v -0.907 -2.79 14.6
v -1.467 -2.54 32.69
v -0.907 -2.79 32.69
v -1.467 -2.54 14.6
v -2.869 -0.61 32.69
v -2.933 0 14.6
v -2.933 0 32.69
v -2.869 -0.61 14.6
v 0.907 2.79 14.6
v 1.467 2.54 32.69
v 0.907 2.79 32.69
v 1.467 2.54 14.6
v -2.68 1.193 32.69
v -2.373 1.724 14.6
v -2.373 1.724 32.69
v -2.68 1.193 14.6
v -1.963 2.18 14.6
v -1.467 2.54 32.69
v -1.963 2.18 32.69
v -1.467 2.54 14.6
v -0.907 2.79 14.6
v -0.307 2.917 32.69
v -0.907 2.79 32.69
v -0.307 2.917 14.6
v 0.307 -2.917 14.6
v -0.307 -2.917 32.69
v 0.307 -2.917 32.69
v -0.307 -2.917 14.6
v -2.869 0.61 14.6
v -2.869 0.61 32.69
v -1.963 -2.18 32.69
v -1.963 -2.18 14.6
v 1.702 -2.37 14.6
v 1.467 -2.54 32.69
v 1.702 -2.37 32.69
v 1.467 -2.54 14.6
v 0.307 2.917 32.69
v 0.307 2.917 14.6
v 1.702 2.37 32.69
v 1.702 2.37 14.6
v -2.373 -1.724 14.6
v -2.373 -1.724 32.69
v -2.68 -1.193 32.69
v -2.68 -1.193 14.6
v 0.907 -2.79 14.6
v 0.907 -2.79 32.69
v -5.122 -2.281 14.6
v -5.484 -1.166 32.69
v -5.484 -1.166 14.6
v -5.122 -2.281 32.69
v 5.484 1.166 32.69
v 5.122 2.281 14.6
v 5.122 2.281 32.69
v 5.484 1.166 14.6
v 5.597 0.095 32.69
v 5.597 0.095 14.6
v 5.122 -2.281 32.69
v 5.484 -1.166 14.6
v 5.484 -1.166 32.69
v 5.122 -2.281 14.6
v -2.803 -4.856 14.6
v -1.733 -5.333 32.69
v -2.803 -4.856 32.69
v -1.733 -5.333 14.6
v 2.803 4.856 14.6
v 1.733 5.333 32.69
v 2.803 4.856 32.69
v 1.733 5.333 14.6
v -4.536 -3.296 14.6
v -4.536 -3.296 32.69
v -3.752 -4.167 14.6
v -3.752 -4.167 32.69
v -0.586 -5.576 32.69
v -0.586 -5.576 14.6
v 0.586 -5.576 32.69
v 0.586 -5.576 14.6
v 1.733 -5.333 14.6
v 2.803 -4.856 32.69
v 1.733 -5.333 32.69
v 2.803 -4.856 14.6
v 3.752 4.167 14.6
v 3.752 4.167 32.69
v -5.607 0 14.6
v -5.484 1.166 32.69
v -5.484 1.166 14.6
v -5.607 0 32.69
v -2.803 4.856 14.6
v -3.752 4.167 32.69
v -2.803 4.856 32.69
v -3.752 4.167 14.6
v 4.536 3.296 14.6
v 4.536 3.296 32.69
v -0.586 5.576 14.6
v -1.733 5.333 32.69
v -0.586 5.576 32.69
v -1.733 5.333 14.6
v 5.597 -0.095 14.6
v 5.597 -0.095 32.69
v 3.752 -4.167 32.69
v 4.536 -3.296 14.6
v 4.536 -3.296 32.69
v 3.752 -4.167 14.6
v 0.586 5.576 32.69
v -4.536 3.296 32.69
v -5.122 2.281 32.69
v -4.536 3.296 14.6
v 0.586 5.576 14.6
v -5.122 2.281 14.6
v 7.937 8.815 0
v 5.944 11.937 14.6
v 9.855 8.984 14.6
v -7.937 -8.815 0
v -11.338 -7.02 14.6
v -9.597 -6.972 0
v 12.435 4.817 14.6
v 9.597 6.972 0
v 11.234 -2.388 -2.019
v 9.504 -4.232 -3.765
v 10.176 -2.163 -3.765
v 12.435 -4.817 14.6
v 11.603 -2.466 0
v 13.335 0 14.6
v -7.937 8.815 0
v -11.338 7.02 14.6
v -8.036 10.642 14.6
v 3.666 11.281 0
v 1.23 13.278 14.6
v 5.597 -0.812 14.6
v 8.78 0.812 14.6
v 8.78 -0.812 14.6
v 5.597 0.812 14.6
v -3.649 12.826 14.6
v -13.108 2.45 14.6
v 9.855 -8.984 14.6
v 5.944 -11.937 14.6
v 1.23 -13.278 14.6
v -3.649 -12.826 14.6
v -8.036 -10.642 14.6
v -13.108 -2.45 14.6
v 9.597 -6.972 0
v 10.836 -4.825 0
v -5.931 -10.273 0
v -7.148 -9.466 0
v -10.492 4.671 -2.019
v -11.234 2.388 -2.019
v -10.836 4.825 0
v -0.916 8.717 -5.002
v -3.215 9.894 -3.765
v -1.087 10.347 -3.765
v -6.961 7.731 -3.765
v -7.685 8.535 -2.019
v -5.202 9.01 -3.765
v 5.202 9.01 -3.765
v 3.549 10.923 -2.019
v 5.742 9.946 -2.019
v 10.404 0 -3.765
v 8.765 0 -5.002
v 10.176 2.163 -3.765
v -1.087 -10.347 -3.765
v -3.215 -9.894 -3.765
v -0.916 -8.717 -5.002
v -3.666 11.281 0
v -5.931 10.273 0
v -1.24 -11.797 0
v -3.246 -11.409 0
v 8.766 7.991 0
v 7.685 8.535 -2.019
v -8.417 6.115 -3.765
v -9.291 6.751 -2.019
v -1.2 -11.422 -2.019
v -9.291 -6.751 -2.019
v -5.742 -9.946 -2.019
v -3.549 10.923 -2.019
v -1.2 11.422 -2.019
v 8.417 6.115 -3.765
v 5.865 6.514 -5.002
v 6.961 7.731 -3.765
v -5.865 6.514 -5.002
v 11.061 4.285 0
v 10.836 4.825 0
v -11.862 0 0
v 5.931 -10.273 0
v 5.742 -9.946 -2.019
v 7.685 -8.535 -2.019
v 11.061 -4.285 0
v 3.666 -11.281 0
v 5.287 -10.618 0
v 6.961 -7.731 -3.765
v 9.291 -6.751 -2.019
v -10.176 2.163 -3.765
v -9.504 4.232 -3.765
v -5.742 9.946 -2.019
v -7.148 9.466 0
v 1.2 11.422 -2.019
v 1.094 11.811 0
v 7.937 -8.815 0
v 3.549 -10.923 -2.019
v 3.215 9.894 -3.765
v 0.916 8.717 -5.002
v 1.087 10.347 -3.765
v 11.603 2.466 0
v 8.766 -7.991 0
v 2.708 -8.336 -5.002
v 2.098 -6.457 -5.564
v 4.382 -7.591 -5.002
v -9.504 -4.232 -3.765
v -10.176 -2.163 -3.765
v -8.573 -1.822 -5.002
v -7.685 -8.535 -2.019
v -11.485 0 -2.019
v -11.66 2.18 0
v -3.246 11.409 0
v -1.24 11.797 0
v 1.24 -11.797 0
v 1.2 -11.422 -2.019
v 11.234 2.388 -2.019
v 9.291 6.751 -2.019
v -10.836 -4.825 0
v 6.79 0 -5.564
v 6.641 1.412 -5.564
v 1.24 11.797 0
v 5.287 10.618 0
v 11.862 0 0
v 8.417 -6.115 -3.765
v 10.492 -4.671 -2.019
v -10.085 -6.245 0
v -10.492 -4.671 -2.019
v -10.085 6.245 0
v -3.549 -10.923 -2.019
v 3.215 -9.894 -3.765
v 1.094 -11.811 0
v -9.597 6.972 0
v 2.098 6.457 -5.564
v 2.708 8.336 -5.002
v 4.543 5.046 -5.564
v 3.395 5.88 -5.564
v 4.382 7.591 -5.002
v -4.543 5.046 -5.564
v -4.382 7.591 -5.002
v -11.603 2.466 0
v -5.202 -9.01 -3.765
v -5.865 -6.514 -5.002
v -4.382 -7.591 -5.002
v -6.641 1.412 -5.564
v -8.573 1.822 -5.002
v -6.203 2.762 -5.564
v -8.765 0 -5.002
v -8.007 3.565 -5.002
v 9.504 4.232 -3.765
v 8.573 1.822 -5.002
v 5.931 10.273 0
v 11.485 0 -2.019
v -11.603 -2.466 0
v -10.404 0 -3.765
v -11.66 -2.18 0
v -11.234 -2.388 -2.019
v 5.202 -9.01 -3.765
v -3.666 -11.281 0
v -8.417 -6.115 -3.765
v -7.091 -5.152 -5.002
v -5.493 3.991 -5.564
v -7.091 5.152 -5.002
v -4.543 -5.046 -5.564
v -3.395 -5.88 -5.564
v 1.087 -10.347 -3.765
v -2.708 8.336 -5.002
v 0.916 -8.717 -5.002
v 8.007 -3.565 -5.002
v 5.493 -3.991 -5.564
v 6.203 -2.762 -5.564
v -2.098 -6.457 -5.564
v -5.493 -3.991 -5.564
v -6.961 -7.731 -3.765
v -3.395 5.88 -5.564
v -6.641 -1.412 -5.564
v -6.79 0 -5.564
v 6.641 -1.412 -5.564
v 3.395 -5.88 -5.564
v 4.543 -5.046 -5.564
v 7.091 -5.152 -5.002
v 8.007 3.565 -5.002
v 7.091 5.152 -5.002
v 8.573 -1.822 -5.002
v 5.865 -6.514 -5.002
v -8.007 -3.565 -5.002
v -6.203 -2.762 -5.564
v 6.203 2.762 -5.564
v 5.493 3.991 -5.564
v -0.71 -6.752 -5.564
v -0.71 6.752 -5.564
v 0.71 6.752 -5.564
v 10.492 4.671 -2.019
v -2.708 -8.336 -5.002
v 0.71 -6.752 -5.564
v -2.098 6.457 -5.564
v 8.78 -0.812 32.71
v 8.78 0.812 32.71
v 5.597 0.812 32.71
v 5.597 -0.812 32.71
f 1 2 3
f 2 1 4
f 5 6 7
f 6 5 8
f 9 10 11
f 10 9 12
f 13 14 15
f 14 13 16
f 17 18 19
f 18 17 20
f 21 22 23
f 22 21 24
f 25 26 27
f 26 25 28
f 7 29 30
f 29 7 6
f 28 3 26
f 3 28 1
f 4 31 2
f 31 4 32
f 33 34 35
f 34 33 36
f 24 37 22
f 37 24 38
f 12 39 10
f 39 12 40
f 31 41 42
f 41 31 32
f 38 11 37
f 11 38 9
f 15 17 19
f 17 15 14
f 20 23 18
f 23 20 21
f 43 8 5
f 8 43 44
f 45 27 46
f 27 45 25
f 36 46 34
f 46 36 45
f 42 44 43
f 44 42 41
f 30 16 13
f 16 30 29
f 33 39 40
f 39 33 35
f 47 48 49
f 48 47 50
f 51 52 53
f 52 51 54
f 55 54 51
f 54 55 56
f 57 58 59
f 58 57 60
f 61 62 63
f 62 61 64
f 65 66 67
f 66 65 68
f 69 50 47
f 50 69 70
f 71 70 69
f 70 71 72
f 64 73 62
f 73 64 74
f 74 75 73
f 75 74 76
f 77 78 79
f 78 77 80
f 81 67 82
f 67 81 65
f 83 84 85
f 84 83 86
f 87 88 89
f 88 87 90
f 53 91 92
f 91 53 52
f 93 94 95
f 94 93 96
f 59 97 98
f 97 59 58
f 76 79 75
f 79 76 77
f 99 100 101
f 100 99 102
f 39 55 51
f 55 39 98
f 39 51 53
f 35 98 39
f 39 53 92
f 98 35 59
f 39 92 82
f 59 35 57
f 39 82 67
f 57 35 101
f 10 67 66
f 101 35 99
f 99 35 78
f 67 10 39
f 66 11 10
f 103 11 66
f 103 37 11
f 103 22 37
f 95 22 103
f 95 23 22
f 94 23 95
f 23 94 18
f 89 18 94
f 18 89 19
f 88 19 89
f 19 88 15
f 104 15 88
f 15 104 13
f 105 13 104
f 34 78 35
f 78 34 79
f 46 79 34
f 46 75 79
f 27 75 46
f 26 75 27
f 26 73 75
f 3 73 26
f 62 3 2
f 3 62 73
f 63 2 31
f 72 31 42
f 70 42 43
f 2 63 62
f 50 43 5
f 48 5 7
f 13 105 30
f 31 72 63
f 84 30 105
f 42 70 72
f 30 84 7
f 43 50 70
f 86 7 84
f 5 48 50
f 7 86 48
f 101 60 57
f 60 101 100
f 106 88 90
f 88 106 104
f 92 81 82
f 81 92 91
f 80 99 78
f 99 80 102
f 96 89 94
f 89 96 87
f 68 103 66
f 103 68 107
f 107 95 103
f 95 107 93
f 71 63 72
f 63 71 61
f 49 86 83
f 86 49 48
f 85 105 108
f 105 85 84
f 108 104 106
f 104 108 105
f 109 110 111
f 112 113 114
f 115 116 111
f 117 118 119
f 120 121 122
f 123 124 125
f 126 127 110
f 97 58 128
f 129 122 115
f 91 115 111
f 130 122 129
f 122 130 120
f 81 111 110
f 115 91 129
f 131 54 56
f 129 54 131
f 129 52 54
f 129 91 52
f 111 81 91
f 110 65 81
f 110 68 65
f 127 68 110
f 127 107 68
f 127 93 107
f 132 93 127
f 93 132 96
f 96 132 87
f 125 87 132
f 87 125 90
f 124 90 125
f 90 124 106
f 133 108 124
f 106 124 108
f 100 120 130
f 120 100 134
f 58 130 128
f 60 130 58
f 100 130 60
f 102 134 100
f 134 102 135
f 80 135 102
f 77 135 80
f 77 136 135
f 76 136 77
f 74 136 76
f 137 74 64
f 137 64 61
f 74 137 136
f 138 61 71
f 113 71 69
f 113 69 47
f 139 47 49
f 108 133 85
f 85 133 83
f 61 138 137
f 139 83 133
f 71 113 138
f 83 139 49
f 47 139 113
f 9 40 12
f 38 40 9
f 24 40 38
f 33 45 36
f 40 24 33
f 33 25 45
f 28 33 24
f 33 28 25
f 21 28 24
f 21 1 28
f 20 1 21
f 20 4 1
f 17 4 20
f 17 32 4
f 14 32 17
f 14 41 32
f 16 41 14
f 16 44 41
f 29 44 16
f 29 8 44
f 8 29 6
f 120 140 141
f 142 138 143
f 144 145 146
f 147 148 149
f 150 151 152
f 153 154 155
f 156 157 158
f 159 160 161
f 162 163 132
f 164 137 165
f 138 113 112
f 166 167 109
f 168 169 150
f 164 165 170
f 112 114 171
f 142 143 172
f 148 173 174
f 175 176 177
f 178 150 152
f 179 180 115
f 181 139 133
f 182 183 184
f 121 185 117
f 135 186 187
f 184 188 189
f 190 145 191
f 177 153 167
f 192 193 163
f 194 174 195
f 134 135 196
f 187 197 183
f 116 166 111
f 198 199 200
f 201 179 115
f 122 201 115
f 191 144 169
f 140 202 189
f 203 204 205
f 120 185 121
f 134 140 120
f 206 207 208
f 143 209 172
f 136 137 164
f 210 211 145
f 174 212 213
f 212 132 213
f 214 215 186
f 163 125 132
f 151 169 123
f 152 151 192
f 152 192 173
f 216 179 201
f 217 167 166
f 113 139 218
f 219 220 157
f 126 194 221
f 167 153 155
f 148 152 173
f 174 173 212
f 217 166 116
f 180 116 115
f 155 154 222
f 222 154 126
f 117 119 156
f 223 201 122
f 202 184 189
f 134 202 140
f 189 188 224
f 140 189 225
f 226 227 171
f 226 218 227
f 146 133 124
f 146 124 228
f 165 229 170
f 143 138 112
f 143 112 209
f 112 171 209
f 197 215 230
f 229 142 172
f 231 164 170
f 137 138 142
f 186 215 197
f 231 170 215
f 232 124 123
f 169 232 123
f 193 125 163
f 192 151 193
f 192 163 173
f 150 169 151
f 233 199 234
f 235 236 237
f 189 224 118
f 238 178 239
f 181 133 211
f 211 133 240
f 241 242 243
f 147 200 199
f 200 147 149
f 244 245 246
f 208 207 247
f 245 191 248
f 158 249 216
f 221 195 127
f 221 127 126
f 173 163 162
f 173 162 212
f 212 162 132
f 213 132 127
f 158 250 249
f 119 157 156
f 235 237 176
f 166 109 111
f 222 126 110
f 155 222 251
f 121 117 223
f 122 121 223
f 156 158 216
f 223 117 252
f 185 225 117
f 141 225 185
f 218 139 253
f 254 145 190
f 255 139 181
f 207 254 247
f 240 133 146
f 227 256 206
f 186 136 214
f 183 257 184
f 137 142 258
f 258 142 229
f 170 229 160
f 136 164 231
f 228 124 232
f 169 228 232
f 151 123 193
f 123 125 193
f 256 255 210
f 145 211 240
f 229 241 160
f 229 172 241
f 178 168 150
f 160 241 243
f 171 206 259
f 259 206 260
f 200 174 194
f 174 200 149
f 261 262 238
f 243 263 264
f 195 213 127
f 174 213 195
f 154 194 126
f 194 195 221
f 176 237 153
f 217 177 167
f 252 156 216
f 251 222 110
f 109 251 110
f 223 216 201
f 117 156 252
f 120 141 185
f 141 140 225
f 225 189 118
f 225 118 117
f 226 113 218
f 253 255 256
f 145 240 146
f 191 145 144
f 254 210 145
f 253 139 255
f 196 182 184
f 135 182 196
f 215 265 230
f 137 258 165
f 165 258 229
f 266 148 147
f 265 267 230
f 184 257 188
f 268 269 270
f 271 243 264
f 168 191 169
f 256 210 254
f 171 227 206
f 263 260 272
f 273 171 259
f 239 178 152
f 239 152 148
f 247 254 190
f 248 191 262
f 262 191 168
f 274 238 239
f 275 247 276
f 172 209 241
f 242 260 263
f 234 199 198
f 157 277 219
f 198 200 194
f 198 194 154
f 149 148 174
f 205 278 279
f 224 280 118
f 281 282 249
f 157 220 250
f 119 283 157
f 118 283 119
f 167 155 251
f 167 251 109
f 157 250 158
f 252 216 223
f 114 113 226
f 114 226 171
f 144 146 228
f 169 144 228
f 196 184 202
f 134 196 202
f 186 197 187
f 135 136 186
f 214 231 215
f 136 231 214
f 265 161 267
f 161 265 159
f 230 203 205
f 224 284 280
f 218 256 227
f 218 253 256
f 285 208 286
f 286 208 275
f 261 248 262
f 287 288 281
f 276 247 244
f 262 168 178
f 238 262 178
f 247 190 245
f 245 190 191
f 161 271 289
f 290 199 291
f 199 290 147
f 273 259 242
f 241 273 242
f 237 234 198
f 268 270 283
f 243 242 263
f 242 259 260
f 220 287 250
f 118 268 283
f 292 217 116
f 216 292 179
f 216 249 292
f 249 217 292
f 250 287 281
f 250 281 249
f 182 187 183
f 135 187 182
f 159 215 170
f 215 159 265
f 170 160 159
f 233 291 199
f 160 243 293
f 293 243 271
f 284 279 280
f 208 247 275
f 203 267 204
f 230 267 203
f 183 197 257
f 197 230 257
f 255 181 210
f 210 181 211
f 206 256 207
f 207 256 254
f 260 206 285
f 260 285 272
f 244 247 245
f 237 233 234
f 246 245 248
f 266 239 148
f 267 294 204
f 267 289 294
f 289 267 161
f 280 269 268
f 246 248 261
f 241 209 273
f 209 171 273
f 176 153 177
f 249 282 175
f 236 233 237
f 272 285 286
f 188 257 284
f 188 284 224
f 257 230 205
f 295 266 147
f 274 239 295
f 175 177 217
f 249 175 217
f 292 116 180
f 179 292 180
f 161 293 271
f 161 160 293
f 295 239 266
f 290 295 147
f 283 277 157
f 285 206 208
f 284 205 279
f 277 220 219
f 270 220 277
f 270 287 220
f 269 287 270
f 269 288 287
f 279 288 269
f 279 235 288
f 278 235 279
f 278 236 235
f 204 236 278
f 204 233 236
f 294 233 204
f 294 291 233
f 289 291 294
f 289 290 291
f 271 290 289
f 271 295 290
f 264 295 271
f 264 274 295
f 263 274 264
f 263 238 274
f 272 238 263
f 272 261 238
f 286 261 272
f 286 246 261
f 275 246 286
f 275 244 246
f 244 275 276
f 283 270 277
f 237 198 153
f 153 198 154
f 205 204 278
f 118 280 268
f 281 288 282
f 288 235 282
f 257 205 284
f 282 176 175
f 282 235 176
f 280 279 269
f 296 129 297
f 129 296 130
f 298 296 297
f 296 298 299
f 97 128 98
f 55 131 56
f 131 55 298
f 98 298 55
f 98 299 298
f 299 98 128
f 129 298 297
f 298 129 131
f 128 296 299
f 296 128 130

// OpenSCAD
//****************************************************
//****************************************************
//General purpose keyed knob.
//by Marc Sulfridge
//****************************************************
//****************************************************

//****************************************************
//Start of user defined parameters.
//****************************************************

//Radius of the rounded fillet at the base of the knob.
fillet_r = 5.588; // [1:10]
//Narrow (bottom) radius of the knob.
min_r = 11.862; // [5:20]
//Wide (top) radius of the knob.
max_r = 13.335; // [5:20]
//Total height of the knob base.
base_h = 20.188; // [5:50]
//Calculated height of the non-fillet portion of the base.
cyl_h = base_h - fillet_r;
//Number of facets for base circle.
base_res = 17; // [10,11,12,13,14,15,16,17,18,19,20]
//Outer shaft radius.
shaft_r = 5.607; // [1:10]
// Shaft height.
shaft_h = 18.1; // [5:50]
//Inner shaft radius.
shaft_in_r = 2.9335; // [0.5:8]
//Width from shaft flat to edge of shaft inner radius.
shaft_in_min_wid = 4.6355; // [0.5:16]
//Number of facets for shaft circle.
shaft_res = 30; // [20,22,24,26,28,30,32,34,36,38,40]
//Thickness of shaft key.
key_th = 1.625; // [0.25:4]
//Width of shaft key from shaft outer radius to end of key.
key_wid = 3.183; // [1:20]
//Number that is large compared to dimensions of the knob.
BIG = 40; // [30,40,50,60,70,80,90,100]
//Fudge factor to ensure overlaps.
dt = 0.01; // [0.001,0.01,0.1]
//****************************************************

// preview[view:north west, tilt:top diagonal]

union(){
	hull(){
		rotate_extrude(convexity = 10){
			translate([min_r-fillet_r, 0])
			circle(r = fillet_r,$fn=base_res);
		}
	cylinder(r1=min_r,r2=max_r,h=cyl_h,center=false,$fn=base_res);
	}

	translate([0,0,cyl_h-dt])
	difference(){
		cylinder(r=shaft_r,h=shaft_h,center=false,$fn=shaft_res);

		difference(){
			cylinder(r=shaft_in_r,h=shaft_h+2*dt,center=false,$fn=shaft_res);

			translate([shaft_in_min_wid-shaft_in_r,-BIG/2,-BIG/2])
			cube([BIG,BIG,BIG],center=false);
		}
	}

	translate([shaft_r-dt,-key_th/2,cyl_h-dt])
	cube([key_wid,key_th,shaft_h+2*dt],center=false);
}

